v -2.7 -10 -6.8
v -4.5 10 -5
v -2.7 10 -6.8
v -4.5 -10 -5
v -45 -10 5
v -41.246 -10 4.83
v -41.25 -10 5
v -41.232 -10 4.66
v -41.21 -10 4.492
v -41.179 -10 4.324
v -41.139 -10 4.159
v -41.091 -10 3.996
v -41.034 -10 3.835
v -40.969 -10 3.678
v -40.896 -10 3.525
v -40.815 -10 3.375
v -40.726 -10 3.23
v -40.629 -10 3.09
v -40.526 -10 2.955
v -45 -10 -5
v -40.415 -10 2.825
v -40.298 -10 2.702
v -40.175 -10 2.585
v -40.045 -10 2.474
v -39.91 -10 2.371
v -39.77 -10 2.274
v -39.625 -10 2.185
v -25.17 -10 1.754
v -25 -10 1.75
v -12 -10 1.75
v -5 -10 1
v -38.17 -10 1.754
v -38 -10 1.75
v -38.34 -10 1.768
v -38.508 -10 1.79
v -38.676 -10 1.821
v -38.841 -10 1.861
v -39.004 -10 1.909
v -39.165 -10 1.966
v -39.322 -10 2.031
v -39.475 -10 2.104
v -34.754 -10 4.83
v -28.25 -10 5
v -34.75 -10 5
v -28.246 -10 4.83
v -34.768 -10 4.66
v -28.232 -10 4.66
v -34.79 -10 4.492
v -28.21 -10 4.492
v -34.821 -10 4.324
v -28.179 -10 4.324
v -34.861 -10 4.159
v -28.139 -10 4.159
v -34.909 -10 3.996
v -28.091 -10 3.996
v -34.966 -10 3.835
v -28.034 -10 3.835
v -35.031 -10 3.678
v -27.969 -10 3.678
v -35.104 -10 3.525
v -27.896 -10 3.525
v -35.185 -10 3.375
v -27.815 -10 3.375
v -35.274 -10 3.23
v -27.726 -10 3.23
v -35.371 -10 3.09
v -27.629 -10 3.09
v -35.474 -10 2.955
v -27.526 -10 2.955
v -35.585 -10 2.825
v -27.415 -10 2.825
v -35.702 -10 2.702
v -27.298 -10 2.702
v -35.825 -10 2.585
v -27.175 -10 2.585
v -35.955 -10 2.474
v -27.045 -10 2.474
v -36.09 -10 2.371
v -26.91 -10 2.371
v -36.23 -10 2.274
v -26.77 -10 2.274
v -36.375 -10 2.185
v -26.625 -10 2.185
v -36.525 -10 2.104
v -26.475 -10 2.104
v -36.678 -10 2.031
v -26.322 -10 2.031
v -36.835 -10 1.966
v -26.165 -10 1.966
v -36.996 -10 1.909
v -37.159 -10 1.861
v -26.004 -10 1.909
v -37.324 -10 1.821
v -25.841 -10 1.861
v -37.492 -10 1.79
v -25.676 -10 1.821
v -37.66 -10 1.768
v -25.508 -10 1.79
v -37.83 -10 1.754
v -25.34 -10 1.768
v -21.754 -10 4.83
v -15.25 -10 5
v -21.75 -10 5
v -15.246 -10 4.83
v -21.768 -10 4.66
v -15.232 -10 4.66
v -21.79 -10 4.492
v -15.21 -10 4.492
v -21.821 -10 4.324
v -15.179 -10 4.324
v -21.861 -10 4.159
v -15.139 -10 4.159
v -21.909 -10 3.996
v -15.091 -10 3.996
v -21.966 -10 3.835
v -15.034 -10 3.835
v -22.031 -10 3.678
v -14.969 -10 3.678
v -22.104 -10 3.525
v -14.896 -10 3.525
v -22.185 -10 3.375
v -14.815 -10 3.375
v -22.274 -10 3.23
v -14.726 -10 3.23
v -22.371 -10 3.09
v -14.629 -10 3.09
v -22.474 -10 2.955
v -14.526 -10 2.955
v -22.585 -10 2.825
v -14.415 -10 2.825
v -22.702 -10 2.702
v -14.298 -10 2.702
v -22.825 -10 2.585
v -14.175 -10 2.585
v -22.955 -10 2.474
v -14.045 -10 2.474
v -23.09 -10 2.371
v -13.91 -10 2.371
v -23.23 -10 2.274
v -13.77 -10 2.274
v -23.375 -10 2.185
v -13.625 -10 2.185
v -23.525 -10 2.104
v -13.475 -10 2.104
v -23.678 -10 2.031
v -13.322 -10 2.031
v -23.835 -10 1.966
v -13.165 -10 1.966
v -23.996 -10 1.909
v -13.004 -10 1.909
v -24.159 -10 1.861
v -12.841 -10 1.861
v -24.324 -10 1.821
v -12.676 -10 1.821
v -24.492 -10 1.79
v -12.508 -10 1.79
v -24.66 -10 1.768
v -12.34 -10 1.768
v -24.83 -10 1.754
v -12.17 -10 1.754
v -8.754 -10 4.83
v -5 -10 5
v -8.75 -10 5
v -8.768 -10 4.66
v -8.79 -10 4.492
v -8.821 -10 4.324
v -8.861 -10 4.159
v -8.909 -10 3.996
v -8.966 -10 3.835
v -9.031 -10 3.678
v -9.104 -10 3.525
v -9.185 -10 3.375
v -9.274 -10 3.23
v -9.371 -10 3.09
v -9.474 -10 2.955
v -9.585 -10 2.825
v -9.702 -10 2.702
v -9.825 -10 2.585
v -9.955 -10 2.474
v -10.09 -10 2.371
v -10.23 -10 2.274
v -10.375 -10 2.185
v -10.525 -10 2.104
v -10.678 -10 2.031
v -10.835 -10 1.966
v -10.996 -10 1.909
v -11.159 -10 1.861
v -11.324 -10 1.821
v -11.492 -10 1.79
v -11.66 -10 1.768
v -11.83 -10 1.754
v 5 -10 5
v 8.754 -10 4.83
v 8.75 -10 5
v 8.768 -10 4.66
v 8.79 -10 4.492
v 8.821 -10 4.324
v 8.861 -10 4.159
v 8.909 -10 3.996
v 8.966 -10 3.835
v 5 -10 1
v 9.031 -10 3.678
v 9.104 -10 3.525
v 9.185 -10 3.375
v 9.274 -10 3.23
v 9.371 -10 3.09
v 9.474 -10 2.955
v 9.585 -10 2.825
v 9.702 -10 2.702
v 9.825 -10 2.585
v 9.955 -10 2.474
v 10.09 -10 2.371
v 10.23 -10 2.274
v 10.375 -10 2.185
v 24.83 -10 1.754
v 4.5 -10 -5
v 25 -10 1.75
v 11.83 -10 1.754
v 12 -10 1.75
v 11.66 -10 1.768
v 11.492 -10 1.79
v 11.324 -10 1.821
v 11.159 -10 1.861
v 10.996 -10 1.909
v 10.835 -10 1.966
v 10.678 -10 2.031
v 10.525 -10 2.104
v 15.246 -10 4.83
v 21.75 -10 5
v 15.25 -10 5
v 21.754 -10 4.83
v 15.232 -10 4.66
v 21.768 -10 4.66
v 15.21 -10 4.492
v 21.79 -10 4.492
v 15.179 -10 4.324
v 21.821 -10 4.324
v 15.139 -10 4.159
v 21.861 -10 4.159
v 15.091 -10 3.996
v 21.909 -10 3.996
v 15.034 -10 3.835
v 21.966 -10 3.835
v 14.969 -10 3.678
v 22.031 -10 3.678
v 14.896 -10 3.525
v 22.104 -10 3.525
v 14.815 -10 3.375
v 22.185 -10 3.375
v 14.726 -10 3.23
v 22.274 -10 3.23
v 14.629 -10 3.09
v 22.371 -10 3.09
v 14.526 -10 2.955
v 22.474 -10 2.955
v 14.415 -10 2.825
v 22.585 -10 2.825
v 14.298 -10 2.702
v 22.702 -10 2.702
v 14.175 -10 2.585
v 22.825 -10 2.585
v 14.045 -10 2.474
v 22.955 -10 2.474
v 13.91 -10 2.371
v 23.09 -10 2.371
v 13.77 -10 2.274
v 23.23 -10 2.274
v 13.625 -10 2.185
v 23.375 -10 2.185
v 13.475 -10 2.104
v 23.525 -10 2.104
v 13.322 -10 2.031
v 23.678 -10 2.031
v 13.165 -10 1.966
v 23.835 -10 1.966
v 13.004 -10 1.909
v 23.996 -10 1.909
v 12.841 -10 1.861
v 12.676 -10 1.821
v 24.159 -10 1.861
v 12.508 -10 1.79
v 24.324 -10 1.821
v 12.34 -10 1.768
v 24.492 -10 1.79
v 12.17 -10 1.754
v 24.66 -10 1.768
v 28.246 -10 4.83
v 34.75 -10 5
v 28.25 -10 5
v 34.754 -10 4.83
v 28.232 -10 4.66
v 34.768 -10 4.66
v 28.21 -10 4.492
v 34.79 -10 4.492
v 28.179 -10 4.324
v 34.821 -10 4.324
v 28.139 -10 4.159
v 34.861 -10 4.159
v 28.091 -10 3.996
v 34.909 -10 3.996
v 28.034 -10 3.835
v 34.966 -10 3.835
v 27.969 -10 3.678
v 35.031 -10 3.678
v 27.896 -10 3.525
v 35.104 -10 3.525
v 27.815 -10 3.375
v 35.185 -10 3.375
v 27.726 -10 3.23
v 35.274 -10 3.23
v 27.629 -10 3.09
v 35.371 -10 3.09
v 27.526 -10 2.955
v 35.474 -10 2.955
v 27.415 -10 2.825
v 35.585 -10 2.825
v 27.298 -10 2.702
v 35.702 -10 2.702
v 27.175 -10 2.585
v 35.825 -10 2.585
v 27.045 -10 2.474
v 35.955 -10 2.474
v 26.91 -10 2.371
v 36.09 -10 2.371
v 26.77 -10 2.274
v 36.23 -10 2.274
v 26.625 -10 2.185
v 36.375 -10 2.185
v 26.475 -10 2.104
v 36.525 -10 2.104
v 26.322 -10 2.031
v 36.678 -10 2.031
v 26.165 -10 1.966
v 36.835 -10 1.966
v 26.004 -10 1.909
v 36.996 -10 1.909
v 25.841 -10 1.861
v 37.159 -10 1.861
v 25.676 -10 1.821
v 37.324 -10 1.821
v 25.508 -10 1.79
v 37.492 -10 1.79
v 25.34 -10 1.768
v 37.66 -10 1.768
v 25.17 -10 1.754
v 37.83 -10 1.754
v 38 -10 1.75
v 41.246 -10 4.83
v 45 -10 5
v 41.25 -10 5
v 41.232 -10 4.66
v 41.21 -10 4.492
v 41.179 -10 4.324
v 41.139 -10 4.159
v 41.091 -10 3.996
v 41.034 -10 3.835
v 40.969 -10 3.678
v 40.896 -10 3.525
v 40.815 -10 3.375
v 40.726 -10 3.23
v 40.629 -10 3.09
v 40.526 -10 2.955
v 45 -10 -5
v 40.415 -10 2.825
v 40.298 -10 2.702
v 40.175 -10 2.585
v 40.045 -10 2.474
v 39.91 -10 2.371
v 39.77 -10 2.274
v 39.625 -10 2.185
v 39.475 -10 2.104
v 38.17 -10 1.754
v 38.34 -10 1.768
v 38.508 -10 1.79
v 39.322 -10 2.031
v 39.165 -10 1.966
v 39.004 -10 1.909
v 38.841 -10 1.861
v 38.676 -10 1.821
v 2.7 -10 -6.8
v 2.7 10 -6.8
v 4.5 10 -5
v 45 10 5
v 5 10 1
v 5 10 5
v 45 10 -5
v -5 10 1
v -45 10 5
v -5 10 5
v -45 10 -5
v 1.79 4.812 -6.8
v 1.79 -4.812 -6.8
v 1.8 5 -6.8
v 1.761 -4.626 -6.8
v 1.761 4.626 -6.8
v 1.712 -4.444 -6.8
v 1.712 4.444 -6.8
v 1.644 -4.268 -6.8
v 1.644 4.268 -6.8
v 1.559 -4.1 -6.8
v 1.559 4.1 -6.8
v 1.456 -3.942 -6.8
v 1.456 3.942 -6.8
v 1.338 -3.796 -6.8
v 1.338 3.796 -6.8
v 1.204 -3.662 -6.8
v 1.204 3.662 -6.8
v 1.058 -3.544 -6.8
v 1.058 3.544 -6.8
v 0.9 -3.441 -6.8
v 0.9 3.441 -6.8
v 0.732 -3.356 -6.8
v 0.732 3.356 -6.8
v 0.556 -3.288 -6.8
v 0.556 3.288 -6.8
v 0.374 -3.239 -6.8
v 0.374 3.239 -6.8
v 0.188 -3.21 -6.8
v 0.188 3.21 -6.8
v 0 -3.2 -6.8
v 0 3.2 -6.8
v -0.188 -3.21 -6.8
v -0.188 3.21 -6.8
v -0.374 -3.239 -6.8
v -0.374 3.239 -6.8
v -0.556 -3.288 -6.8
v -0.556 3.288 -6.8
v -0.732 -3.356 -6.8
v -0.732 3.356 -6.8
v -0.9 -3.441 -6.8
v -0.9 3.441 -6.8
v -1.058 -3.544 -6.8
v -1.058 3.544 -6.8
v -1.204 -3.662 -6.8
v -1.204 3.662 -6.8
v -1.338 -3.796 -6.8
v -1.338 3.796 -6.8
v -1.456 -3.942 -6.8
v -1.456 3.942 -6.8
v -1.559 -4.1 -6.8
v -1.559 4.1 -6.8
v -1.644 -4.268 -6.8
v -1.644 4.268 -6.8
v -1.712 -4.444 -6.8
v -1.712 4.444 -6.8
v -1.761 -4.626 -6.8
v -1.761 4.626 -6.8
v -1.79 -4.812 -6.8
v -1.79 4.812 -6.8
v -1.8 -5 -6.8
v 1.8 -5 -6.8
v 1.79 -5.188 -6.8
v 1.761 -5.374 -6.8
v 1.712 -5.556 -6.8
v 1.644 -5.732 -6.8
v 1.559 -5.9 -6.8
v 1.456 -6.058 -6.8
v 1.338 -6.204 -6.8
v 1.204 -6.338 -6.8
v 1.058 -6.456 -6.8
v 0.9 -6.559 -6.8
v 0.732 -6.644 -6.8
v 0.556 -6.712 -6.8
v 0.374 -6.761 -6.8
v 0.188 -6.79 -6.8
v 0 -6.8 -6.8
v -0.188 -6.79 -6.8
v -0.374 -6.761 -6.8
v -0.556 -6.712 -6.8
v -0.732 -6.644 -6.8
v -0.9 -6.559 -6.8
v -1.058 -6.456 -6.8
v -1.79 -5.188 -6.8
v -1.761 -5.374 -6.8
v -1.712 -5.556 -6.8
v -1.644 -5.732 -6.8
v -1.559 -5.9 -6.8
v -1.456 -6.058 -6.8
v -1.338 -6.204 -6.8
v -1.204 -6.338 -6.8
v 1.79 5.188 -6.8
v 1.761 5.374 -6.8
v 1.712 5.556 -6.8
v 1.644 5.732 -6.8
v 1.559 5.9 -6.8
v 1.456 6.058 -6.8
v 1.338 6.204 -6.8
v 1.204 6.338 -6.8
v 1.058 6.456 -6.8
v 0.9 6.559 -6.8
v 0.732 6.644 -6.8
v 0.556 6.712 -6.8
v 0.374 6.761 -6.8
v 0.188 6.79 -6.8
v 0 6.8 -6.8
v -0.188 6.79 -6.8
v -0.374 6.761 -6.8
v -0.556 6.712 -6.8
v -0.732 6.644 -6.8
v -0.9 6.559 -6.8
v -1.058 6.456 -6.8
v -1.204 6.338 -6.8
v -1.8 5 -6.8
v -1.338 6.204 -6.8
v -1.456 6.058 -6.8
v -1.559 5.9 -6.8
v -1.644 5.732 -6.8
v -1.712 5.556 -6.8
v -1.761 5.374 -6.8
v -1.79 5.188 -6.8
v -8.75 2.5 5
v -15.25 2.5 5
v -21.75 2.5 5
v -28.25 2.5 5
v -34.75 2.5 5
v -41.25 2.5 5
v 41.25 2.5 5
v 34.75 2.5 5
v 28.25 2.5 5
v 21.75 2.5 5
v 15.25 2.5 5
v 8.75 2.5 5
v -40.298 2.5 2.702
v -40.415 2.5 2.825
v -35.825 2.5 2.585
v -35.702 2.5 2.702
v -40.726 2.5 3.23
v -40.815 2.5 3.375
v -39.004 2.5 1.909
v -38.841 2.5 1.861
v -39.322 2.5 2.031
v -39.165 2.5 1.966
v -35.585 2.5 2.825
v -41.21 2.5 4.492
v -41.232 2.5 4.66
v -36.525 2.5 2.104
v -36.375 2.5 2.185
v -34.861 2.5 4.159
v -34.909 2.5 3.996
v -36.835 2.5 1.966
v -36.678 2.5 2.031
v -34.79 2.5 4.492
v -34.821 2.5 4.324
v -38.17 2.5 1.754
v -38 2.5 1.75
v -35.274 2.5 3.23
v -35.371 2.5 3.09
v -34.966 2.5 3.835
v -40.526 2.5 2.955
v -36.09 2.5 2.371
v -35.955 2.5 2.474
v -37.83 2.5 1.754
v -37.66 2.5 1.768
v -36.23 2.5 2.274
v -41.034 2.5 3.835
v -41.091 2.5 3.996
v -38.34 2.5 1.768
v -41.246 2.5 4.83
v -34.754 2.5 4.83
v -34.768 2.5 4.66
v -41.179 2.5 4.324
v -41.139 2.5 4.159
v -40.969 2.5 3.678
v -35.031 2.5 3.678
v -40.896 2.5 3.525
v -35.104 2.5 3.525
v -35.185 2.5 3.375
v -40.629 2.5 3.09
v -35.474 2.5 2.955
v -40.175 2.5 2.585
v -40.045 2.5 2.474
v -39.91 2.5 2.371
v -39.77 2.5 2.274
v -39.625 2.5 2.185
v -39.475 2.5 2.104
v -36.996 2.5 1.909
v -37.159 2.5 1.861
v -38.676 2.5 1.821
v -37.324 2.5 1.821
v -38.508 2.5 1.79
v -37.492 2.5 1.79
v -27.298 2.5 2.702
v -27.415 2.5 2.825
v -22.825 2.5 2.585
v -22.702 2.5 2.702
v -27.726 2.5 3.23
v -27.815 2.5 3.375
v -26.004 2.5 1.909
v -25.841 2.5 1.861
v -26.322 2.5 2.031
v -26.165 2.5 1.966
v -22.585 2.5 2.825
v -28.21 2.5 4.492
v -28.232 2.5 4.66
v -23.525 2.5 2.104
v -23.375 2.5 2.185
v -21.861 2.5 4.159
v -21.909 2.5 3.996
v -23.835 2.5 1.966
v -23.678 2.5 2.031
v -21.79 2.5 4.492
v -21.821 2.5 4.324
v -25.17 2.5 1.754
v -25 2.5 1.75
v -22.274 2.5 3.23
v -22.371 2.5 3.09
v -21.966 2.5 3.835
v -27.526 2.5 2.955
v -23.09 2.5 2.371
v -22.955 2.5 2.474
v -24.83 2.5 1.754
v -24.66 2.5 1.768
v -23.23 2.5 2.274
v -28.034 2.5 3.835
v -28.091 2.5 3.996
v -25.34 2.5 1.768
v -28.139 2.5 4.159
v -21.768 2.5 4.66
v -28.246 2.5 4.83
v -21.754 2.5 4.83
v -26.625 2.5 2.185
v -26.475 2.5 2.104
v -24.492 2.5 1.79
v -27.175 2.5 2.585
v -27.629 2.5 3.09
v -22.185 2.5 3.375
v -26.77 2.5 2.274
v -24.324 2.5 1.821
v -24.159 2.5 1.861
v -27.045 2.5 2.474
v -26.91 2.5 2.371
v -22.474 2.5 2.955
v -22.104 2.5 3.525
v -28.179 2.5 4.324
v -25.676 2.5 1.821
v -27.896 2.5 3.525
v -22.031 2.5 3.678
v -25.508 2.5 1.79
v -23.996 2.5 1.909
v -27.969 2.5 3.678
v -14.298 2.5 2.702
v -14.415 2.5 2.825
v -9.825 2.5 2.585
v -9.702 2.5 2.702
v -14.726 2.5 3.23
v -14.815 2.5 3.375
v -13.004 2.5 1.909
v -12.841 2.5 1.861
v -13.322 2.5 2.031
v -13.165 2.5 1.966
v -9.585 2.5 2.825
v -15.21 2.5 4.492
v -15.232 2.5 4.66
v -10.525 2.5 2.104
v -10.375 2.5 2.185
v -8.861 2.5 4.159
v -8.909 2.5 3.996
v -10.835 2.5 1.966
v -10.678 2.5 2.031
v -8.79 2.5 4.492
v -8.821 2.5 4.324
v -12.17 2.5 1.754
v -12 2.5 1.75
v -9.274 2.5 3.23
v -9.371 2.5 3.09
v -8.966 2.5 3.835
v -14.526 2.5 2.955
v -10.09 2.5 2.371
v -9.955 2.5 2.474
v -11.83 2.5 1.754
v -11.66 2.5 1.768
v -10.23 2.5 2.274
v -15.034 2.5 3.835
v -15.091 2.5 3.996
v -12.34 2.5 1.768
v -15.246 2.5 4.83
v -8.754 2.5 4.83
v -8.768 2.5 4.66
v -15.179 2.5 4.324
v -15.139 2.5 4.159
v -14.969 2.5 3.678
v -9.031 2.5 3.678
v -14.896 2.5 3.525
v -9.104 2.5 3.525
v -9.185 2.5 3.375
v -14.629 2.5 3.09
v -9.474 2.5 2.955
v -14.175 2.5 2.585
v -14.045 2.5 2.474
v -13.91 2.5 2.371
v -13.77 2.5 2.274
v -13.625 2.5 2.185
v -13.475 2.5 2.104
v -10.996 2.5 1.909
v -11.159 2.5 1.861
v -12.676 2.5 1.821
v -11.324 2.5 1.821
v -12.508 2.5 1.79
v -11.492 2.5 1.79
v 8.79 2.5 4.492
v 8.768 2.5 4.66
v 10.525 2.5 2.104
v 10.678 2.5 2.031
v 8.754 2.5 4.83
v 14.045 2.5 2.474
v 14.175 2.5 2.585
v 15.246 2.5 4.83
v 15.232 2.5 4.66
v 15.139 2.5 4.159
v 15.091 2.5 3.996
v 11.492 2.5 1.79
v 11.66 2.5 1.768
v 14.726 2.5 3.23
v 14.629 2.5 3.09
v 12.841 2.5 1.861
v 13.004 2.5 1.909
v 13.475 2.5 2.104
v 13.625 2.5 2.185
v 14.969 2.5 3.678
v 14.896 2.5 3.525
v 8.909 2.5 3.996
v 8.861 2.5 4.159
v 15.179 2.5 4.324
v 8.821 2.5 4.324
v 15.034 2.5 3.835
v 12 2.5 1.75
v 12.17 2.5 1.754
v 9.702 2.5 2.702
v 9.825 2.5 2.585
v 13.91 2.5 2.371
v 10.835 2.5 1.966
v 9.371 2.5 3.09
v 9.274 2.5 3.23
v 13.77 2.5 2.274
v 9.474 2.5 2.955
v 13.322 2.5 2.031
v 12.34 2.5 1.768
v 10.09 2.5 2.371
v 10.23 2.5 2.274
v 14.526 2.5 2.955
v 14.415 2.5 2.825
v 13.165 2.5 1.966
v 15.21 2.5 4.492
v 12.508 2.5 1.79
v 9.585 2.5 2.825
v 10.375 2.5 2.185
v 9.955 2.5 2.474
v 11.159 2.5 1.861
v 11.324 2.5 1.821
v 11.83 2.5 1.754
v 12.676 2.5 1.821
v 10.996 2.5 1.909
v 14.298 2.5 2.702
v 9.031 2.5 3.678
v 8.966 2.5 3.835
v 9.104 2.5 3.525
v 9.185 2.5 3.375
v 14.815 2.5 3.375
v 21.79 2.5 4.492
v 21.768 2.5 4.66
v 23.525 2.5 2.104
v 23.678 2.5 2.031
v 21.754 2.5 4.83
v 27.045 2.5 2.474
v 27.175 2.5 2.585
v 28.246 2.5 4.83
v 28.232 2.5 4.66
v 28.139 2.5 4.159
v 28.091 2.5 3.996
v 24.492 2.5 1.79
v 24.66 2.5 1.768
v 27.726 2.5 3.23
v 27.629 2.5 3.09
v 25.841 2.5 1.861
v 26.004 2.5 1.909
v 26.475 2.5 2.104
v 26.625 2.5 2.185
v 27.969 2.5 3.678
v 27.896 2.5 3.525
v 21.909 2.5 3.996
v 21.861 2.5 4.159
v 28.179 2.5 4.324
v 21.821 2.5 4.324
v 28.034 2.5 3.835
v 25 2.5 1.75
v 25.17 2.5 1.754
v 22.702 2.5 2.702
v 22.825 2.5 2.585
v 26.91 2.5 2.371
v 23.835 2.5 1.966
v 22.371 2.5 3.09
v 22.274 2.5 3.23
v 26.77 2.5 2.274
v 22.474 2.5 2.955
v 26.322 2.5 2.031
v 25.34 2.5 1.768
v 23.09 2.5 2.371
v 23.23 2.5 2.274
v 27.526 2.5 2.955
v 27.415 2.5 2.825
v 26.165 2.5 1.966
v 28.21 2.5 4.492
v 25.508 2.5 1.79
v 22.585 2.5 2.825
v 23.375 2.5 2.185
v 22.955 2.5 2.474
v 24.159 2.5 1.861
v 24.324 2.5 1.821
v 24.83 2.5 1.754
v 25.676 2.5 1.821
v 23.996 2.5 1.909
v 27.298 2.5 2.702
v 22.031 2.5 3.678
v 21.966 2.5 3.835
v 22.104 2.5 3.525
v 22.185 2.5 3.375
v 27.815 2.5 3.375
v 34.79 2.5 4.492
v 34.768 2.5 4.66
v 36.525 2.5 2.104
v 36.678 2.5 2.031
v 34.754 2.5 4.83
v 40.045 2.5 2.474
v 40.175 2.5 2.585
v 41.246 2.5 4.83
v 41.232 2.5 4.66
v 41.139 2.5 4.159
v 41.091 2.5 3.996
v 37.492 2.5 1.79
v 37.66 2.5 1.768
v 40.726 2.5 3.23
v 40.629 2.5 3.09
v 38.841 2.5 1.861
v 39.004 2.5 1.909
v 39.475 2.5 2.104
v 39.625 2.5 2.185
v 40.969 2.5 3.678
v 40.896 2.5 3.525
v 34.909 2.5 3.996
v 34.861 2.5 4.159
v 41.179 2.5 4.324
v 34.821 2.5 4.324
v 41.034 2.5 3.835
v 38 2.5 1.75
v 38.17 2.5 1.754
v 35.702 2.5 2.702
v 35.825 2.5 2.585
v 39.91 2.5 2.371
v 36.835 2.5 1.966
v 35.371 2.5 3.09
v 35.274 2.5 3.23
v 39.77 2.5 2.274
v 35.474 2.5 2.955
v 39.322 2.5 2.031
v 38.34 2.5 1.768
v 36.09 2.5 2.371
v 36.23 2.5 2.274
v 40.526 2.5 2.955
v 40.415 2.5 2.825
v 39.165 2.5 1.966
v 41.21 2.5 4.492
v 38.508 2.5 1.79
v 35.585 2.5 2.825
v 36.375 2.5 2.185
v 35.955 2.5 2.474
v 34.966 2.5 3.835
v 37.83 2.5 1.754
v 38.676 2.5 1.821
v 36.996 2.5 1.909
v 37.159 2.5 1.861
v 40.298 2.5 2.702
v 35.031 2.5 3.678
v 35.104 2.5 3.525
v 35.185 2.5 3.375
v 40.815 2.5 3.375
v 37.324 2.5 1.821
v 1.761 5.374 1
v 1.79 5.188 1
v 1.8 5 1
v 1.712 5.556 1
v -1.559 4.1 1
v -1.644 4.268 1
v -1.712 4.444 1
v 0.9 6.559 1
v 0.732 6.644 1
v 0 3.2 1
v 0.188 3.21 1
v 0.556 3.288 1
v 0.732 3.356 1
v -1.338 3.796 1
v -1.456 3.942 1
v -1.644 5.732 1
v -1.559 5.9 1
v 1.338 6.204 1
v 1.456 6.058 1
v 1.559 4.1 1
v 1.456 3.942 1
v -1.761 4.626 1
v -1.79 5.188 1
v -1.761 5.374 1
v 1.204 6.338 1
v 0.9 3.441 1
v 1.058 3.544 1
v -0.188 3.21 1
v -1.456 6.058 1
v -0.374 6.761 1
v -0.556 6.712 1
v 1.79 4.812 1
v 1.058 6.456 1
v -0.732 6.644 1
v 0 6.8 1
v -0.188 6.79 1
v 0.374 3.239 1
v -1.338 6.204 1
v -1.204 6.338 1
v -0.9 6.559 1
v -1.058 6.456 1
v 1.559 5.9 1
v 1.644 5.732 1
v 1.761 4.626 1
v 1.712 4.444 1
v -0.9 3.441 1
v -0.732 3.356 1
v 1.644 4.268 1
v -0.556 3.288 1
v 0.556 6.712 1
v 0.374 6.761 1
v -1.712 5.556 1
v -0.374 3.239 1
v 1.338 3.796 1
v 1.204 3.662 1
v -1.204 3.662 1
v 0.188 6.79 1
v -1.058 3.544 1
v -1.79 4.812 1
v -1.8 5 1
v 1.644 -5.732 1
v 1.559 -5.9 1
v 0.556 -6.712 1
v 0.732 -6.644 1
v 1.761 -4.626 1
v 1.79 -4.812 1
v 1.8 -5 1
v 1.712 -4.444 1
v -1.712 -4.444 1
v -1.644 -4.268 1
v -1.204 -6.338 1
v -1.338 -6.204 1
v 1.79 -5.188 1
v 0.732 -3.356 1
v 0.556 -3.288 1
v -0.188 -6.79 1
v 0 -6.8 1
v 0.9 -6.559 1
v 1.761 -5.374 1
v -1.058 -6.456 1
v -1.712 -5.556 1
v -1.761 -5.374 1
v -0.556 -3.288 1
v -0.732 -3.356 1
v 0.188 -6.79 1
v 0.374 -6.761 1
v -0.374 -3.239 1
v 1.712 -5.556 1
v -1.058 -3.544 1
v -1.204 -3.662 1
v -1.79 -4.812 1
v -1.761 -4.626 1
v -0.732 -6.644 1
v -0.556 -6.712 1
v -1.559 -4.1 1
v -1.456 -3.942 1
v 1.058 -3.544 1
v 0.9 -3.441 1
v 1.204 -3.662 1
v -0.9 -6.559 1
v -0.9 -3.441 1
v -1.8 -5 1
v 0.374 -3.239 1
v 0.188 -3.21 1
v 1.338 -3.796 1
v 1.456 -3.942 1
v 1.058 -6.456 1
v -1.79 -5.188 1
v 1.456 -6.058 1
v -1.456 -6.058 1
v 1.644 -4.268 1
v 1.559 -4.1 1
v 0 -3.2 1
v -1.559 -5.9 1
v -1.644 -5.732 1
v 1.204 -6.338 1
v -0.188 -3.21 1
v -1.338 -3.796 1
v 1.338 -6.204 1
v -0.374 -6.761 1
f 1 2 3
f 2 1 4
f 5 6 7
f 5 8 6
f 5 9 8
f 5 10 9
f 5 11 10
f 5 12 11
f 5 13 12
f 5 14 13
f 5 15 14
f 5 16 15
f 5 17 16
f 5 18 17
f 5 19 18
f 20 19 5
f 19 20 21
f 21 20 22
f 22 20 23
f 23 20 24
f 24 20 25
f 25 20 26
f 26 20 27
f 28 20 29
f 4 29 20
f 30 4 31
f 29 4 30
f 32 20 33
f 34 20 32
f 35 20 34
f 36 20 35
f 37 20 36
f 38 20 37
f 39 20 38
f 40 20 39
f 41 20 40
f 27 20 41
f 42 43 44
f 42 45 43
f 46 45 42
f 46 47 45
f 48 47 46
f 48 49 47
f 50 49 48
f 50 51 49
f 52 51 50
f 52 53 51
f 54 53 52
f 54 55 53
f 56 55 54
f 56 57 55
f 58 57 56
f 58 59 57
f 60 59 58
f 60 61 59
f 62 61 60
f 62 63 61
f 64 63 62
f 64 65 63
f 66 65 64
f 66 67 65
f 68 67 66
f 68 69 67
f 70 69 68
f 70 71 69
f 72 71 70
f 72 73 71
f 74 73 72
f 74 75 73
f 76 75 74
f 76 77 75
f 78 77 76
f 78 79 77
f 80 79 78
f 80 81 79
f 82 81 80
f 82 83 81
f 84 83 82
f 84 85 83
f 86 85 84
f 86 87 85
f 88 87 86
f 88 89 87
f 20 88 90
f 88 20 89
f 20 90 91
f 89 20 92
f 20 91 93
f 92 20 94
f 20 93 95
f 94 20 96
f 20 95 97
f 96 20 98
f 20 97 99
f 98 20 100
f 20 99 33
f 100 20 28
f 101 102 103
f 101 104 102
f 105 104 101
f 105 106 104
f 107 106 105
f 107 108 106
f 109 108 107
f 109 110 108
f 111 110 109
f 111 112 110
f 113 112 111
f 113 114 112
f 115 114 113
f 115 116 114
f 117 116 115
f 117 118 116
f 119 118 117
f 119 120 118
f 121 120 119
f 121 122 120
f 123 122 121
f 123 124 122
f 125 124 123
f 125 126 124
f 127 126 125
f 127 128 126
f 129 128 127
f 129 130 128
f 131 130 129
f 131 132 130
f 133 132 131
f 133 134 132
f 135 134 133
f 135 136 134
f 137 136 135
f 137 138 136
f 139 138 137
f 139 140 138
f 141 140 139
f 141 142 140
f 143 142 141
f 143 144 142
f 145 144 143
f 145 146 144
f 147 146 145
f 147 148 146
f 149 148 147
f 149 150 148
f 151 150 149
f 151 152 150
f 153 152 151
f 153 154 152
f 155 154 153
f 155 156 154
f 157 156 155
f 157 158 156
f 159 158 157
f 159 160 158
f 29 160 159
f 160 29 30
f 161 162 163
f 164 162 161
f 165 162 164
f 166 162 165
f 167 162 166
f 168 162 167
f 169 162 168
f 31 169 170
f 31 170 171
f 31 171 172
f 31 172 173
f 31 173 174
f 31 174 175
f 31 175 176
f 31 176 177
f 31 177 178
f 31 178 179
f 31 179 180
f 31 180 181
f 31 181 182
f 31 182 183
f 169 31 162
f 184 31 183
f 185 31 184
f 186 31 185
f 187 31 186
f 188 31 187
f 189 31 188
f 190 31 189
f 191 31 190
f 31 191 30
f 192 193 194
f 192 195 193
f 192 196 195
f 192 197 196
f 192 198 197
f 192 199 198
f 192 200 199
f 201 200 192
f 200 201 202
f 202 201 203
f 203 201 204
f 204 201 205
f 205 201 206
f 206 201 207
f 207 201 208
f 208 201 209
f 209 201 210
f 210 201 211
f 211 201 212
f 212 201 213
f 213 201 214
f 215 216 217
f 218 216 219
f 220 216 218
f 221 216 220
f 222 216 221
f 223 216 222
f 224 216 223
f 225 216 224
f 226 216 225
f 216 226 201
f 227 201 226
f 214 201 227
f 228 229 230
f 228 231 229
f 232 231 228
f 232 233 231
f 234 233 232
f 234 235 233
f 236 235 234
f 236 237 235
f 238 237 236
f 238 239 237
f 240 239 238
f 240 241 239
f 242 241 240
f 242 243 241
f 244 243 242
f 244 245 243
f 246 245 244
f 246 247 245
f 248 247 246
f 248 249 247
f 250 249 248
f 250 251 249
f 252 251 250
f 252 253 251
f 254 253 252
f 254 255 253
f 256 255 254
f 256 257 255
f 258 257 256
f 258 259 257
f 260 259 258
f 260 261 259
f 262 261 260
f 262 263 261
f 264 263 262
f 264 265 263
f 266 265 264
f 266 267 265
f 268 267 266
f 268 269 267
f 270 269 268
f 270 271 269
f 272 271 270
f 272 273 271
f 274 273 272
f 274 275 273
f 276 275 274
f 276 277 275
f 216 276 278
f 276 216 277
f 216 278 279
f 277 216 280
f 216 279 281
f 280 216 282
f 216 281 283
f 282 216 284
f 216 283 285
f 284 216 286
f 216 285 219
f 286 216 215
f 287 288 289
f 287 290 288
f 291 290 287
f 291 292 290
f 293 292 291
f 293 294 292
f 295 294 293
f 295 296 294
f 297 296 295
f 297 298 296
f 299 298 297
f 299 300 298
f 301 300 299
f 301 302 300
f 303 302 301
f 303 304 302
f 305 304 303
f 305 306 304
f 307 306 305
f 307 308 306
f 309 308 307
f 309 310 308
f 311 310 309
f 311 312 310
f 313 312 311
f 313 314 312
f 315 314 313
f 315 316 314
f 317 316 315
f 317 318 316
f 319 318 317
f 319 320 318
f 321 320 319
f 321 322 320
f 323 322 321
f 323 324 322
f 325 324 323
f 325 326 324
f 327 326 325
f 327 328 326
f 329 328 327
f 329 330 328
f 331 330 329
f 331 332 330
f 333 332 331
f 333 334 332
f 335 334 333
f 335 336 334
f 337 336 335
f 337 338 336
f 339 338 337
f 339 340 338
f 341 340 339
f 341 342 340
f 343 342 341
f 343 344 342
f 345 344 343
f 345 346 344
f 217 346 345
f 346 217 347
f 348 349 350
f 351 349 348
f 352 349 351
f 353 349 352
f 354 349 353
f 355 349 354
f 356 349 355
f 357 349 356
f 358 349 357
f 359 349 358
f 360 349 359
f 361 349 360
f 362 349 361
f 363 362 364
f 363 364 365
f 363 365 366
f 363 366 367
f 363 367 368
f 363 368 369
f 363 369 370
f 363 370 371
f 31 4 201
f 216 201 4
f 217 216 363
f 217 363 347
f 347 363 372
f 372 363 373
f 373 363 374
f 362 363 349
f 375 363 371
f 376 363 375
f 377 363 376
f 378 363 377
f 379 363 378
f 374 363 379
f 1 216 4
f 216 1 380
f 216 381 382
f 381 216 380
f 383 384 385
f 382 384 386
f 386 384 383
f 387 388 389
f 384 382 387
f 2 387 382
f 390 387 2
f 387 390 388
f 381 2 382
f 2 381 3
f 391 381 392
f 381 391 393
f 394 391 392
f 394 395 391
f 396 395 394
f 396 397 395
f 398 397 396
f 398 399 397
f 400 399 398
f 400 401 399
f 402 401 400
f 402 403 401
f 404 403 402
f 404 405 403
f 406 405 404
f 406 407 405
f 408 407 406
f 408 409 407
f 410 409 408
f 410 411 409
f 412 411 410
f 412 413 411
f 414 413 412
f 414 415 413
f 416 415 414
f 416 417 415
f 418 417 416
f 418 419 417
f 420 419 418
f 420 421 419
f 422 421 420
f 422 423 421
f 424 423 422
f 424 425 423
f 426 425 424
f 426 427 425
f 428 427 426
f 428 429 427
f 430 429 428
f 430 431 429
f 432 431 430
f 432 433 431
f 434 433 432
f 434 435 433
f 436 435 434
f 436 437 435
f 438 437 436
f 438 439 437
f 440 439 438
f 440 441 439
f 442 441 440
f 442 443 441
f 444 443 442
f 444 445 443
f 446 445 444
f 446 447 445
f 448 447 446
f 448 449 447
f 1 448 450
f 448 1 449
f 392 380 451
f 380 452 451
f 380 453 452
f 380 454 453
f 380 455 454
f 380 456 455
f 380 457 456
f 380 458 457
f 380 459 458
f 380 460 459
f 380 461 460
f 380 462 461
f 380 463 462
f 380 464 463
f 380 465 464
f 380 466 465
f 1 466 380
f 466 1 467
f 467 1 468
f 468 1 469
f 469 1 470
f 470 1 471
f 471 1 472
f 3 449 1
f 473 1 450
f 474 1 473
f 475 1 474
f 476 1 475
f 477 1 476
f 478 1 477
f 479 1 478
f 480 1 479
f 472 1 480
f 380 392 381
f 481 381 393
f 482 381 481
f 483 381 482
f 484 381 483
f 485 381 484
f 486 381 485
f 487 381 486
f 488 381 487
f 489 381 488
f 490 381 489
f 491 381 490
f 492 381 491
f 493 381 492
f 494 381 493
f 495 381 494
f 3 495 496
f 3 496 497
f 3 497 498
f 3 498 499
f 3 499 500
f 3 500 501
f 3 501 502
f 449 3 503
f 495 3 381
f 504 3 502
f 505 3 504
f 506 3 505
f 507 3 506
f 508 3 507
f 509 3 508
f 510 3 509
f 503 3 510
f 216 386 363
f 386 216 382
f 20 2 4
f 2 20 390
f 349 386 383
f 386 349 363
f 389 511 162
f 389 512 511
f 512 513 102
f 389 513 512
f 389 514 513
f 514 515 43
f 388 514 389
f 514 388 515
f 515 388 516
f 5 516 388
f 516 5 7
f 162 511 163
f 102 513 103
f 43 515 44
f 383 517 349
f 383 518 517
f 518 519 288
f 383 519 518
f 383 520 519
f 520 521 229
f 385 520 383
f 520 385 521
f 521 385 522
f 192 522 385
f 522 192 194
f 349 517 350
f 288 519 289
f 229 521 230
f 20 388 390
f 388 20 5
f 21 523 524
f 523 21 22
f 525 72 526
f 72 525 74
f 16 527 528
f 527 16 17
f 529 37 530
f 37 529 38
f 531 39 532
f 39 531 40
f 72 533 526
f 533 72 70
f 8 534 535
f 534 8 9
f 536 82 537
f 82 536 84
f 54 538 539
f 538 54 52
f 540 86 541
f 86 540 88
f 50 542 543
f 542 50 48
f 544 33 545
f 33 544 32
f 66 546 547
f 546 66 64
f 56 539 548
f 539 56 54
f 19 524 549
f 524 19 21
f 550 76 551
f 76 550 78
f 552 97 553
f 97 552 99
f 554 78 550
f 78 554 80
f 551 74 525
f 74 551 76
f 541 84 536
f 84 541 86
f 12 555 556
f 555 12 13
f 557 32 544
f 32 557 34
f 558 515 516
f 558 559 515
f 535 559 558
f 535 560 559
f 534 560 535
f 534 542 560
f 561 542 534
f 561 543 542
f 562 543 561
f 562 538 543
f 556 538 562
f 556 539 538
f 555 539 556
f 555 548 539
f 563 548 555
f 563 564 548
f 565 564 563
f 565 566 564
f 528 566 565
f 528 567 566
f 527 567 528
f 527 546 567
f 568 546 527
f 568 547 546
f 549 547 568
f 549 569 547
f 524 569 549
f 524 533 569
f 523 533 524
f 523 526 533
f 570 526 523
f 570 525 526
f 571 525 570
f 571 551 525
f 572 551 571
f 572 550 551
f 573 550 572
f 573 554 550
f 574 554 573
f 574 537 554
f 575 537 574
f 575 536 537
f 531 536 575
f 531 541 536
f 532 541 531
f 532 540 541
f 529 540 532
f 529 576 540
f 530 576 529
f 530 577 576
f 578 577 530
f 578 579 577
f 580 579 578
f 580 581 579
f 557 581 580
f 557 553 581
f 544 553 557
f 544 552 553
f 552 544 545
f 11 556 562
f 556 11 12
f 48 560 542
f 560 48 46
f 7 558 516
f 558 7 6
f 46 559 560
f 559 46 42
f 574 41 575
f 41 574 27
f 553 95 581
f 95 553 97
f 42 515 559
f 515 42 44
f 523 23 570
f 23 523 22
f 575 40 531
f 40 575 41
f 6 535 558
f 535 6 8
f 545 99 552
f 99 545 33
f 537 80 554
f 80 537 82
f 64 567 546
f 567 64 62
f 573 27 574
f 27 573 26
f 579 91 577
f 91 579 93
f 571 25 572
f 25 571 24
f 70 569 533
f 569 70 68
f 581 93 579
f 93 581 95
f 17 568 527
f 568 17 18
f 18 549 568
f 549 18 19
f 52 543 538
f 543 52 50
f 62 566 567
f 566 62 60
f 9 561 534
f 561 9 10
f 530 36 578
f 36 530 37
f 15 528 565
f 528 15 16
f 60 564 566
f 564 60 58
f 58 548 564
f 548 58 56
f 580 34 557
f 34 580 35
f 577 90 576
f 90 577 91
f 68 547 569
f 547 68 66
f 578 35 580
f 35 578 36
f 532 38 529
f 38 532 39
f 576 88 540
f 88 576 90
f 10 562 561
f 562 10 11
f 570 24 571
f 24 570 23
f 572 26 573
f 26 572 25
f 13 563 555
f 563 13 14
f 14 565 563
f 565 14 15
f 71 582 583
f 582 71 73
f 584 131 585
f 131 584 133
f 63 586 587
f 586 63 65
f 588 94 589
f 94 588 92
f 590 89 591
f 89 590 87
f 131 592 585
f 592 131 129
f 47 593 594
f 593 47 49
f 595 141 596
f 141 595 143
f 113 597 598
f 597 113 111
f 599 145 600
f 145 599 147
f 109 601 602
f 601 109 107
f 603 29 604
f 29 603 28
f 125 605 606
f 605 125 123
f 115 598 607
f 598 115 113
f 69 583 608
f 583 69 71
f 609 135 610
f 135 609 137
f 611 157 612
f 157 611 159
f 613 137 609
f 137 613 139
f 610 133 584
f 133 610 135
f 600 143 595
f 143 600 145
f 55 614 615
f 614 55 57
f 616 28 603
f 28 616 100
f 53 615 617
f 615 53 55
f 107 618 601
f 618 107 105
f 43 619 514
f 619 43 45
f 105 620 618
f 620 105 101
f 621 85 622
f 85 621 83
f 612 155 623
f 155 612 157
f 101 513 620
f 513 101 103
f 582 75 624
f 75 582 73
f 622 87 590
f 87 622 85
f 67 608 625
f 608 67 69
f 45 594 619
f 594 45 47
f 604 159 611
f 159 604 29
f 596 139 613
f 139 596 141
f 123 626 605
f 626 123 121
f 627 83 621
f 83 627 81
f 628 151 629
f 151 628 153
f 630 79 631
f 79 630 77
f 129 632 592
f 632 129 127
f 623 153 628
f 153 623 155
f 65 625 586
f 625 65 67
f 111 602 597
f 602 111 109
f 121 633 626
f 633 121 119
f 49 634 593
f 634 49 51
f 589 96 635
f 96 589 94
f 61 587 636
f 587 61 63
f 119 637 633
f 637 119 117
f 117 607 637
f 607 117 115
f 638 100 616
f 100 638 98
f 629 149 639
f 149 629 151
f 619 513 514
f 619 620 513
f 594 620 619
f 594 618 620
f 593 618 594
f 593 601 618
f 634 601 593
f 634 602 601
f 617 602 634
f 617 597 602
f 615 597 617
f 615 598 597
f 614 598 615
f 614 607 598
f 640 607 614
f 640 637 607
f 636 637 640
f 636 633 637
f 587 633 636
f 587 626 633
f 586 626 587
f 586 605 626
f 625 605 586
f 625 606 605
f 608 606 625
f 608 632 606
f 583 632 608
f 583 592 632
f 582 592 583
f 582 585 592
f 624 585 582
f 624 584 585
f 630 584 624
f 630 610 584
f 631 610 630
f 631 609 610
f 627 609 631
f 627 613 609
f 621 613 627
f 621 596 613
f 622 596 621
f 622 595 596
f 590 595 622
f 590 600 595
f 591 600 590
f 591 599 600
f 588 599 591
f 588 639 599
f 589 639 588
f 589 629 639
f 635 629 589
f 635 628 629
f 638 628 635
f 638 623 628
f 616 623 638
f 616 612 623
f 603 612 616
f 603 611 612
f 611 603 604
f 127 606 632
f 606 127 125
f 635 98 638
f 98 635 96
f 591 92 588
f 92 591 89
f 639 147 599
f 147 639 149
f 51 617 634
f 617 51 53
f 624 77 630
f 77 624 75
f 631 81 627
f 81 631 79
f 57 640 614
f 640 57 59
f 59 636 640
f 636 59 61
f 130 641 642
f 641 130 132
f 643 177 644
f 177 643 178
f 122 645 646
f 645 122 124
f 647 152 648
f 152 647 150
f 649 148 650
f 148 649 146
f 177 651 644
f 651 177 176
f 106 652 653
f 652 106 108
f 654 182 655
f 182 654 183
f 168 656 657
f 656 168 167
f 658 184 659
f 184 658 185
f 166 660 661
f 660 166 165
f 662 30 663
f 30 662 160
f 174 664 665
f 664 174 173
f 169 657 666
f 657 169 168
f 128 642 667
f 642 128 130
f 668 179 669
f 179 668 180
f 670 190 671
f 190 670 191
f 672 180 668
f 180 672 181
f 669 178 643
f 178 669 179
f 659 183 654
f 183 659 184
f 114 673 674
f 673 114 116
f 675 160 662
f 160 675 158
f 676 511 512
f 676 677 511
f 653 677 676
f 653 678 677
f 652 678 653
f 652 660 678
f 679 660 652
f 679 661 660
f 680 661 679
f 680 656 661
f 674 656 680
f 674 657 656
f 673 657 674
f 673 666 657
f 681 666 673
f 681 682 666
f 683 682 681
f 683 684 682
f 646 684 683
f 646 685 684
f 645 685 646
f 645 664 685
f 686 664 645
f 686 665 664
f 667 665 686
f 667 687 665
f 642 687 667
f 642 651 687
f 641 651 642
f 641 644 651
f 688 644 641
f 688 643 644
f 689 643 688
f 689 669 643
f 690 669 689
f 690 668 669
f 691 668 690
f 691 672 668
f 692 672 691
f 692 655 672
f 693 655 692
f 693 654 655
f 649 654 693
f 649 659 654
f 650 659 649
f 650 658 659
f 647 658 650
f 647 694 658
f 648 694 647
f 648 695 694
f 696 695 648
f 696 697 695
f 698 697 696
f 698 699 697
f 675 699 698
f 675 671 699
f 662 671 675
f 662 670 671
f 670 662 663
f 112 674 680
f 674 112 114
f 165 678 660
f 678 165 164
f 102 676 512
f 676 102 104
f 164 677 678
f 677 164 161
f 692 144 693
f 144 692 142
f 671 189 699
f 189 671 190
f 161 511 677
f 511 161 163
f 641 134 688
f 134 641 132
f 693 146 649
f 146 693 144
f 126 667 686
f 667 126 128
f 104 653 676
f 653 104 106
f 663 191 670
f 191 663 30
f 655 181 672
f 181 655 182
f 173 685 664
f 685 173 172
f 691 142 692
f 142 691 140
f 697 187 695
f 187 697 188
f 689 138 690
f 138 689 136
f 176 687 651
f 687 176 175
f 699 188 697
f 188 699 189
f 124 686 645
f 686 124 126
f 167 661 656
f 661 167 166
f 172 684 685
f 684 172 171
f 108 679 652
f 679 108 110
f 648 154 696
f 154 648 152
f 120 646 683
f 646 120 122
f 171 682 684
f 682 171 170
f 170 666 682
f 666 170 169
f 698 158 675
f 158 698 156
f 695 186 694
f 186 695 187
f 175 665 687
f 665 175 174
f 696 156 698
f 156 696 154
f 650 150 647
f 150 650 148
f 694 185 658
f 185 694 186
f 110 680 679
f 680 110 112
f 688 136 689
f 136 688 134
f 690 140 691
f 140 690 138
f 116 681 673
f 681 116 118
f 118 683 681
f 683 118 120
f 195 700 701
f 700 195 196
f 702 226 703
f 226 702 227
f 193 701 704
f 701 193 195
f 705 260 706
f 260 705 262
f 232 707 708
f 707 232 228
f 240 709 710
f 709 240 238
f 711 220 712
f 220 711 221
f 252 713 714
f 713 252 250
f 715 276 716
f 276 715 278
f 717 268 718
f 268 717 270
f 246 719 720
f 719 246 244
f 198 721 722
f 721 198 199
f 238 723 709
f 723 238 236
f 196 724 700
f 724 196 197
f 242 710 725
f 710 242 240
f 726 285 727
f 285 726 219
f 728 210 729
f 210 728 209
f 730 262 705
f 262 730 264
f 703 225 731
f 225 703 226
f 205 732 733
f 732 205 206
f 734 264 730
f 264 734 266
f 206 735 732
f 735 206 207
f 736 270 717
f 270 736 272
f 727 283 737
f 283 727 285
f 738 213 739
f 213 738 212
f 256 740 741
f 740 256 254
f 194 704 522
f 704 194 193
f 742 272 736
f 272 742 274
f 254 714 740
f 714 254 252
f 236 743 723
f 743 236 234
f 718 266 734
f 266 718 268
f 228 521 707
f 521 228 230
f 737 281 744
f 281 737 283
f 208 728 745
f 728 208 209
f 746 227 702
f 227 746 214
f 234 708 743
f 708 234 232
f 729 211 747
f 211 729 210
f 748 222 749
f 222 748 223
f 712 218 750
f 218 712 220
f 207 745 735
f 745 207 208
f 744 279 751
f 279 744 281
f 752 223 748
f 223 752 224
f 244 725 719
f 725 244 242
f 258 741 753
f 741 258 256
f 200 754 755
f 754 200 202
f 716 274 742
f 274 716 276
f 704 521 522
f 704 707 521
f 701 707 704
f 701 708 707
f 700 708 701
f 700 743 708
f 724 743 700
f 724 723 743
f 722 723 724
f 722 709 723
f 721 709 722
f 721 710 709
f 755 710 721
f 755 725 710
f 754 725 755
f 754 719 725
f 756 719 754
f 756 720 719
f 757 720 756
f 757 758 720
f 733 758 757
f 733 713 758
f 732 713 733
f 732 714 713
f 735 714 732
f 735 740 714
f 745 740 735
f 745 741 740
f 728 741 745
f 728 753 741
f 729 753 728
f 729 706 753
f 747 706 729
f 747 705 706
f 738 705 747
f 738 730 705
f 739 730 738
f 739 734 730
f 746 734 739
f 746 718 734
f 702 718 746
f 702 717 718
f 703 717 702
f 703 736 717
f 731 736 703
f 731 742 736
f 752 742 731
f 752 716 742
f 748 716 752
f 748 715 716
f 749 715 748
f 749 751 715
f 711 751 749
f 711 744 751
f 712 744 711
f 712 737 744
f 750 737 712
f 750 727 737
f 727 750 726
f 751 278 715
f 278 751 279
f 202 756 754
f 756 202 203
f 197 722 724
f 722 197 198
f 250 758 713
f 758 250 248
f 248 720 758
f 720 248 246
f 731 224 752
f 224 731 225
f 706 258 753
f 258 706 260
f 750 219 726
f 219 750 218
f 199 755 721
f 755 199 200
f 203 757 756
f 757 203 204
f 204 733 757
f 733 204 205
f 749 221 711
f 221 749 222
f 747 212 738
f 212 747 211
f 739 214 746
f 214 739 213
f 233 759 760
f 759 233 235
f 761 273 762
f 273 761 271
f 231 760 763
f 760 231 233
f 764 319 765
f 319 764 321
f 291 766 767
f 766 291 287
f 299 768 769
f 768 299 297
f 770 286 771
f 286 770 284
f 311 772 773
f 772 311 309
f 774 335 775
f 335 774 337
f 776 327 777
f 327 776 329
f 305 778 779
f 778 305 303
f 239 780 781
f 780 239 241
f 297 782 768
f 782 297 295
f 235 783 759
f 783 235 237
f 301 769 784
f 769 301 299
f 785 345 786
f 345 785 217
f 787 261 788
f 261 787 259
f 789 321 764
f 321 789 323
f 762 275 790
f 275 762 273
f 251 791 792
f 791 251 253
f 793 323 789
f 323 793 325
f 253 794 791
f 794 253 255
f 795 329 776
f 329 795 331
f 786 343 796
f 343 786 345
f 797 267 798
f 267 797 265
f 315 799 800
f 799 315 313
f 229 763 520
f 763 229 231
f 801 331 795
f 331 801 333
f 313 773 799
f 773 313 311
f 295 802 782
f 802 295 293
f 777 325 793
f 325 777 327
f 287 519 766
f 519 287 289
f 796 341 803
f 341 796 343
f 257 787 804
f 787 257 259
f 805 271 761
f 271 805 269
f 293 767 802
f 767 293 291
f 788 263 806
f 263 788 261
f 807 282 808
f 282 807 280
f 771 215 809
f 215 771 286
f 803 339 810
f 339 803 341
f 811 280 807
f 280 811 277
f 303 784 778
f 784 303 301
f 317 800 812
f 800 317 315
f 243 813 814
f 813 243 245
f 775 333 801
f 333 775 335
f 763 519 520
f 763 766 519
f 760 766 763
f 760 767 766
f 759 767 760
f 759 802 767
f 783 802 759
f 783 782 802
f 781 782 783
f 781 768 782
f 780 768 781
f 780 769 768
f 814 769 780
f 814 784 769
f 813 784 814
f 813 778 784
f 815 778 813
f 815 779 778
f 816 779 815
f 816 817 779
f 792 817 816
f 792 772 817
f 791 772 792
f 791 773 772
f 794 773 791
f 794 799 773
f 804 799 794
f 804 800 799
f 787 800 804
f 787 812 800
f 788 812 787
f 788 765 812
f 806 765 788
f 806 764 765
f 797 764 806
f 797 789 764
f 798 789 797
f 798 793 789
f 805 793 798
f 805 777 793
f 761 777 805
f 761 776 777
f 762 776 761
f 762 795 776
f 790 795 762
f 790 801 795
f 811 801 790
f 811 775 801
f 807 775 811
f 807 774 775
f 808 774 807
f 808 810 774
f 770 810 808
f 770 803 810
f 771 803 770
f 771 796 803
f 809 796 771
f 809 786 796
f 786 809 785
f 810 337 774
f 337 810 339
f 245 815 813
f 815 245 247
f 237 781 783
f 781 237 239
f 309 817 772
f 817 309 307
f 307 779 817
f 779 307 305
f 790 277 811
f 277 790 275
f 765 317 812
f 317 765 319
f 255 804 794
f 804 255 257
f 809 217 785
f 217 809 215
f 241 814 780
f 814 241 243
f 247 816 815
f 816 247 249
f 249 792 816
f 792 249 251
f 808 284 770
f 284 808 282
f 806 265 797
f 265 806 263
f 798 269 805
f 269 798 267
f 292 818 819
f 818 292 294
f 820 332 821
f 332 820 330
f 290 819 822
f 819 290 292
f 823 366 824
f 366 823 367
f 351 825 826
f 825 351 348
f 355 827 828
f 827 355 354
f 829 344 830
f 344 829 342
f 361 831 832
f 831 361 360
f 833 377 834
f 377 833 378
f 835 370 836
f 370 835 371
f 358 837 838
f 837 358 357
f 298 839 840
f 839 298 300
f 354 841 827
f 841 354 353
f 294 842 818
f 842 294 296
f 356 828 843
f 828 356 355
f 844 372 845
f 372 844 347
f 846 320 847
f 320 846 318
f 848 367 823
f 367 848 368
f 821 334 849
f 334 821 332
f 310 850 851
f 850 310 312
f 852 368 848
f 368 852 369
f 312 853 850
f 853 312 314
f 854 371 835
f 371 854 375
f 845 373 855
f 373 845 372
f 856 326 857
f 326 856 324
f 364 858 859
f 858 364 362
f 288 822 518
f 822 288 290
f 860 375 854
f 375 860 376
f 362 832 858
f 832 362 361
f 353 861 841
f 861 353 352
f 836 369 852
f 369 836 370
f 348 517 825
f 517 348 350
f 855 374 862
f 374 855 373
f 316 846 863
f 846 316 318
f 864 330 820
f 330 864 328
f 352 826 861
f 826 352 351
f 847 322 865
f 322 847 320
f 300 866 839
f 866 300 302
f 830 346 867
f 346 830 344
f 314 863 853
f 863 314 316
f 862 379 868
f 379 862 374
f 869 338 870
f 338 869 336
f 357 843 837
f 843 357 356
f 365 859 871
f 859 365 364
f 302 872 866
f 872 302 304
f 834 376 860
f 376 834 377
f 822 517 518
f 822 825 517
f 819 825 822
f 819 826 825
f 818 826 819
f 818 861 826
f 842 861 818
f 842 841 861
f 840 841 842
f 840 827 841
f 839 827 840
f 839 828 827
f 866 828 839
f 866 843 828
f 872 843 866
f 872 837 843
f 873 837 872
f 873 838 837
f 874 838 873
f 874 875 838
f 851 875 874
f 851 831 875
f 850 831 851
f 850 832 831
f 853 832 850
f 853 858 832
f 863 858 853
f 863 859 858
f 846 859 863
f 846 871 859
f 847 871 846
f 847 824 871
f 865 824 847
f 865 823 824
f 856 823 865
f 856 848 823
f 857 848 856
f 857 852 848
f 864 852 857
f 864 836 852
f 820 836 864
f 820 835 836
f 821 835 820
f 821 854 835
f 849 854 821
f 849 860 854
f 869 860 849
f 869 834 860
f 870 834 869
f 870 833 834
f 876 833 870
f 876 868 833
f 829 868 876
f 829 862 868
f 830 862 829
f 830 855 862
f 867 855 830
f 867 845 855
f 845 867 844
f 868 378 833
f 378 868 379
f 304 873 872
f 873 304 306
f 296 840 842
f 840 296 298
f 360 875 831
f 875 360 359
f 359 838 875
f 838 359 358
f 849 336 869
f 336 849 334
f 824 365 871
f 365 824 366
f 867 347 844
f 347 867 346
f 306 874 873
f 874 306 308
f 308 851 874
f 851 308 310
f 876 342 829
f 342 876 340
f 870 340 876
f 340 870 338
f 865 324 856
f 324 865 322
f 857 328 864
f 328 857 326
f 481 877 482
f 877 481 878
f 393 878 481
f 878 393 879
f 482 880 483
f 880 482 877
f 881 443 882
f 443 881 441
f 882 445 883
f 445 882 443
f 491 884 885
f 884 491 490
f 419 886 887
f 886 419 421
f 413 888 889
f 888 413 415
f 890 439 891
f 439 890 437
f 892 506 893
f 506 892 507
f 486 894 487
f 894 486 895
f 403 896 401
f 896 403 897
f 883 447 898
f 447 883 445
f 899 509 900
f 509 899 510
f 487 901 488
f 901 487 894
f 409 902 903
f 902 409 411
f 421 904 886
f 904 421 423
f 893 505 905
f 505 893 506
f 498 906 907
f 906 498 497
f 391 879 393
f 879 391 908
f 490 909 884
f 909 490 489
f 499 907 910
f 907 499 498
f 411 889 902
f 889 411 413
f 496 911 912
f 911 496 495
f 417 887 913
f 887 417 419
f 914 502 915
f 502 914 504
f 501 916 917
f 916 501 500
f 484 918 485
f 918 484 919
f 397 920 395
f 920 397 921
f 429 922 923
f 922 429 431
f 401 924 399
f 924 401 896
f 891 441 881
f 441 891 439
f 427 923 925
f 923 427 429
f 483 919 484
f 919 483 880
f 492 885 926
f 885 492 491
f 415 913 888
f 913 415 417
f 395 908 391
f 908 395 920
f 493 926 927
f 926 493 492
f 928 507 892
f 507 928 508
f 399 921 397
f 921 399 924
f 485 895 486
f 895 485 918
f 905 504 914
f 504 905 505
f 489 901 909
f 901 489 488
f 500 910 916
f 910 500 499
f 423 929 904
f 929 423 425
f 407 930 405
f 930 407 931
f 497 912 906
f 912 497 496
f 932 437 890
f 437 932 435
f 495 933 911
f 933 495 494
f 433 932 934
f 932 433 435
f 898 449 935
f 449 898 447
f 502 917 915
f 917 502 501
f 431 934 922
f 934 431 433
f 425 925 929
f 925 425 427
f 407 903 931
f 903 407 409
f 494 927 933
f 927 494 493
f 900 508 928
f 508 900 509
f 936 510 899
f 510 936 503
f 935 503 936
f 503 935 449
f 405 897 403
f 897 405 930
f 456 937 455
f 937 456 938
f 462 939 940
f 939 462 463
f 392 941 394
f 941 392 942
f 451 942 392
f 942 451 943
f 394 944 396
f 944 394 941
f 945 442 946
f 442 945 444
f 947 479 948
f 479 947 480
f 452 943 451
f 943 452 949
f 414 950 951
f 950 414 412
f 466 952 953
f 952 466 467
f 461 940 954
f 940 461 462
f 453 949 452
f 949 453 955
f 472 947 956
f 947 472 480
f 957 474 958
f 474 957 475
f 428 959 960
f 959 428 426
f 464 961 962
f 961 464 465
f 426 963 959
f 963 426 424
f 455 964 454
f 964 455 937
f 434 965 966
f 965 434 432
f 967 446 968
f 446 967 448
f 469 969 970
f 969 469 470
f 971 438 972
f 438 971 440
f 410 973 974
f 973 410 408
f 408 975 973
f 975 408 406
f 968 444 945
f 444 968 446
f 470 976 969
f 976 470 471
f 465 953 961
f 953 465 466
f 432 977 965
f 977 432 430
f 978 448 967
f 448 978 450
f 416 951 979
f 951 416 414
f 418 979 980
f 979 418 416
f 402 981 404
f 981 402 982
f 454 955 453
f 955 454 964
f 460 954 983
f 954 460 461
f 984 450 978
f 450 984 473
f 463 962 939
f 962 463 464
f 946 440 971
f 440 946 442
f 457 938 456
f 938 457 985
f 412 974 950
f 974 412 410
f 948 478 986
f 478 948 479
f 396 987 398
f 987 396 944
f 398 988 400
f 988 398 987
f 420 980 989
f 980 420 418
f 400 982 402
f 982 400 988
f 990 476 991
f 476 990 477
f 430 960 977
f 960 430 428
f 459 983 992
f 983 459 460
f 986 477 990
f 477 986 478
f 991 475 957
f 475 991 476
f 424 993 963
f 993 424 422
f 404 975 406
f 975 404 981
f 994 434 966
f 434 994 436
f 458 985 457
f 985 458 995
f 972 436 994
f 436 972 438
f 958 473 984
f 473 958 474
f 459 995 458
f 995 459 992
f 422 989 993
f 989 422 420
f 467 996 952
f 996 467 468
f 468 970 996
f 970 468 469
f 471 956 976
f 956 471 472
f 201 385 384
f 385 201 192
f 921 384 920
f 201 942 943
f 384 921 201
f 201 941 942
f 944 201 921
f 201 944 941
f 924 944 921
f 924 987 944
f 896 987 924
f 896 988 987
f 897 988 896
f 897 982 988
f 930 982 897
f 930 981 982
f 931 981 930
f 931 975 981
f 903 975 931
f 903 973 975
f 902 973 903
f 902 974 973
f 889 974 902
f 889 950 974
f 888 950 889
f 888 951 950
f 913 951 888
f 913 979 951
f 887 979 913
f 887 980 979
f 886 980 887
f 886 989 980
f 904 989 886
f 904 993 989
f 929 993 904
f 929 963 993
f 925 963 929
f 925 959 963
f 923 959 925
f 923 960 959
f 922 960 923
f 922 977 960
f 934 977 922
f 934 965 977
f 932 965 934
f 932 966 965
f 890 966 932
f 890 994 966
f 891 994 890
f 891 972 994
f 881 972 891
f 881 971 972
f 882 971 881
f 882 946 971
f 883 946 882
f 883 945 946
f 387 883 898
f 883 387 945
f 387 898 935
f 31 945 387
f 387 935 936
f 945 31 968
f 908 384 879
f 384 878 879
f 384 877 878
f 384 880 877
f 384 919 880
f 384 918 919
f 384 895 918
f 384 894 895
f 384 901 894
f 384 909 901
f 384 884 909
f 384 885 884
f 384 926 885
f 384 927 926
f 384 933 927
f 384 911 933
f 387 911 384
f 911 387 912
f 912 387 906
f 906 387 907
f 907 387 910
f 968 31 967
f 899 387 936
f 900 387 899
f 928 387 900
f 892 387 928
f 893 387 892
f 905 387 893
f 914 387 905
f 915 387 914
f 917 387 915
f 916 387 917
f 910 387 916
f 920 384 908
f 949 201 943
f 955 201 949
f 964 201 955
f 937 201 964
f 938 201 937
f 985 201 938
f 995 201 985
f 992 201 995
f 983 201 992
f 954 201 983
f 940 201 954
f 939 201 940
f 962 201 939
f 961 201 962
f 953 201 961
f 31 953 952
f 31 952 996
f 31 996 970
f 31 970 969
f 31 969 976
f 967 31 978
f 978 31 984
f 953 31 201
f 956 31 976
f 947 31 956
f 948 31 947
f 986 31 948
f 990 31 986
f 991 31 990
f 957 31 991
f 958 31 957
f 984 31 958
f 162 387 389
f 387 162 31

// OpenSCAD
module slot_fill(length = 20) {
	difference() {
		translate([0, 0, 0]) rotate([0, 0, 0])
		 cylinder(r=4.5, h=length, center=true,  $fn=4);	

//plane sides
		translate([-3.8, 0, 0]) rotate([0, 0, 0])
		 cube([4, 20, length*2], center=true);
		translate([3, 0, 0]) rotate([0, 0, 0])
		 cube([6, 20, length*2], center=true);
	}
}

difference(){
  union(){
    cube([90,20,10], center=true);
    translate([0, 0, -5]) rotate([0,-90,90]) slot_fill();
  }
  translate([0,5,0]) cylinder(d=3.6, h=15, center=true, $fn=60);
  translate([0,-5,0]) cylinder(d=3.6, h=15, center=true, $fn=60);
  for(X=[-38,-25,-12, 12, 25, 38]){
    translate([X,-5,5]) rotate([90, 0, 0]) cylinder(d=6.5, h=15, center=true, $fn=120);
  }
  translate([0,0,4]) cube([10,22,6], center=true);
}
